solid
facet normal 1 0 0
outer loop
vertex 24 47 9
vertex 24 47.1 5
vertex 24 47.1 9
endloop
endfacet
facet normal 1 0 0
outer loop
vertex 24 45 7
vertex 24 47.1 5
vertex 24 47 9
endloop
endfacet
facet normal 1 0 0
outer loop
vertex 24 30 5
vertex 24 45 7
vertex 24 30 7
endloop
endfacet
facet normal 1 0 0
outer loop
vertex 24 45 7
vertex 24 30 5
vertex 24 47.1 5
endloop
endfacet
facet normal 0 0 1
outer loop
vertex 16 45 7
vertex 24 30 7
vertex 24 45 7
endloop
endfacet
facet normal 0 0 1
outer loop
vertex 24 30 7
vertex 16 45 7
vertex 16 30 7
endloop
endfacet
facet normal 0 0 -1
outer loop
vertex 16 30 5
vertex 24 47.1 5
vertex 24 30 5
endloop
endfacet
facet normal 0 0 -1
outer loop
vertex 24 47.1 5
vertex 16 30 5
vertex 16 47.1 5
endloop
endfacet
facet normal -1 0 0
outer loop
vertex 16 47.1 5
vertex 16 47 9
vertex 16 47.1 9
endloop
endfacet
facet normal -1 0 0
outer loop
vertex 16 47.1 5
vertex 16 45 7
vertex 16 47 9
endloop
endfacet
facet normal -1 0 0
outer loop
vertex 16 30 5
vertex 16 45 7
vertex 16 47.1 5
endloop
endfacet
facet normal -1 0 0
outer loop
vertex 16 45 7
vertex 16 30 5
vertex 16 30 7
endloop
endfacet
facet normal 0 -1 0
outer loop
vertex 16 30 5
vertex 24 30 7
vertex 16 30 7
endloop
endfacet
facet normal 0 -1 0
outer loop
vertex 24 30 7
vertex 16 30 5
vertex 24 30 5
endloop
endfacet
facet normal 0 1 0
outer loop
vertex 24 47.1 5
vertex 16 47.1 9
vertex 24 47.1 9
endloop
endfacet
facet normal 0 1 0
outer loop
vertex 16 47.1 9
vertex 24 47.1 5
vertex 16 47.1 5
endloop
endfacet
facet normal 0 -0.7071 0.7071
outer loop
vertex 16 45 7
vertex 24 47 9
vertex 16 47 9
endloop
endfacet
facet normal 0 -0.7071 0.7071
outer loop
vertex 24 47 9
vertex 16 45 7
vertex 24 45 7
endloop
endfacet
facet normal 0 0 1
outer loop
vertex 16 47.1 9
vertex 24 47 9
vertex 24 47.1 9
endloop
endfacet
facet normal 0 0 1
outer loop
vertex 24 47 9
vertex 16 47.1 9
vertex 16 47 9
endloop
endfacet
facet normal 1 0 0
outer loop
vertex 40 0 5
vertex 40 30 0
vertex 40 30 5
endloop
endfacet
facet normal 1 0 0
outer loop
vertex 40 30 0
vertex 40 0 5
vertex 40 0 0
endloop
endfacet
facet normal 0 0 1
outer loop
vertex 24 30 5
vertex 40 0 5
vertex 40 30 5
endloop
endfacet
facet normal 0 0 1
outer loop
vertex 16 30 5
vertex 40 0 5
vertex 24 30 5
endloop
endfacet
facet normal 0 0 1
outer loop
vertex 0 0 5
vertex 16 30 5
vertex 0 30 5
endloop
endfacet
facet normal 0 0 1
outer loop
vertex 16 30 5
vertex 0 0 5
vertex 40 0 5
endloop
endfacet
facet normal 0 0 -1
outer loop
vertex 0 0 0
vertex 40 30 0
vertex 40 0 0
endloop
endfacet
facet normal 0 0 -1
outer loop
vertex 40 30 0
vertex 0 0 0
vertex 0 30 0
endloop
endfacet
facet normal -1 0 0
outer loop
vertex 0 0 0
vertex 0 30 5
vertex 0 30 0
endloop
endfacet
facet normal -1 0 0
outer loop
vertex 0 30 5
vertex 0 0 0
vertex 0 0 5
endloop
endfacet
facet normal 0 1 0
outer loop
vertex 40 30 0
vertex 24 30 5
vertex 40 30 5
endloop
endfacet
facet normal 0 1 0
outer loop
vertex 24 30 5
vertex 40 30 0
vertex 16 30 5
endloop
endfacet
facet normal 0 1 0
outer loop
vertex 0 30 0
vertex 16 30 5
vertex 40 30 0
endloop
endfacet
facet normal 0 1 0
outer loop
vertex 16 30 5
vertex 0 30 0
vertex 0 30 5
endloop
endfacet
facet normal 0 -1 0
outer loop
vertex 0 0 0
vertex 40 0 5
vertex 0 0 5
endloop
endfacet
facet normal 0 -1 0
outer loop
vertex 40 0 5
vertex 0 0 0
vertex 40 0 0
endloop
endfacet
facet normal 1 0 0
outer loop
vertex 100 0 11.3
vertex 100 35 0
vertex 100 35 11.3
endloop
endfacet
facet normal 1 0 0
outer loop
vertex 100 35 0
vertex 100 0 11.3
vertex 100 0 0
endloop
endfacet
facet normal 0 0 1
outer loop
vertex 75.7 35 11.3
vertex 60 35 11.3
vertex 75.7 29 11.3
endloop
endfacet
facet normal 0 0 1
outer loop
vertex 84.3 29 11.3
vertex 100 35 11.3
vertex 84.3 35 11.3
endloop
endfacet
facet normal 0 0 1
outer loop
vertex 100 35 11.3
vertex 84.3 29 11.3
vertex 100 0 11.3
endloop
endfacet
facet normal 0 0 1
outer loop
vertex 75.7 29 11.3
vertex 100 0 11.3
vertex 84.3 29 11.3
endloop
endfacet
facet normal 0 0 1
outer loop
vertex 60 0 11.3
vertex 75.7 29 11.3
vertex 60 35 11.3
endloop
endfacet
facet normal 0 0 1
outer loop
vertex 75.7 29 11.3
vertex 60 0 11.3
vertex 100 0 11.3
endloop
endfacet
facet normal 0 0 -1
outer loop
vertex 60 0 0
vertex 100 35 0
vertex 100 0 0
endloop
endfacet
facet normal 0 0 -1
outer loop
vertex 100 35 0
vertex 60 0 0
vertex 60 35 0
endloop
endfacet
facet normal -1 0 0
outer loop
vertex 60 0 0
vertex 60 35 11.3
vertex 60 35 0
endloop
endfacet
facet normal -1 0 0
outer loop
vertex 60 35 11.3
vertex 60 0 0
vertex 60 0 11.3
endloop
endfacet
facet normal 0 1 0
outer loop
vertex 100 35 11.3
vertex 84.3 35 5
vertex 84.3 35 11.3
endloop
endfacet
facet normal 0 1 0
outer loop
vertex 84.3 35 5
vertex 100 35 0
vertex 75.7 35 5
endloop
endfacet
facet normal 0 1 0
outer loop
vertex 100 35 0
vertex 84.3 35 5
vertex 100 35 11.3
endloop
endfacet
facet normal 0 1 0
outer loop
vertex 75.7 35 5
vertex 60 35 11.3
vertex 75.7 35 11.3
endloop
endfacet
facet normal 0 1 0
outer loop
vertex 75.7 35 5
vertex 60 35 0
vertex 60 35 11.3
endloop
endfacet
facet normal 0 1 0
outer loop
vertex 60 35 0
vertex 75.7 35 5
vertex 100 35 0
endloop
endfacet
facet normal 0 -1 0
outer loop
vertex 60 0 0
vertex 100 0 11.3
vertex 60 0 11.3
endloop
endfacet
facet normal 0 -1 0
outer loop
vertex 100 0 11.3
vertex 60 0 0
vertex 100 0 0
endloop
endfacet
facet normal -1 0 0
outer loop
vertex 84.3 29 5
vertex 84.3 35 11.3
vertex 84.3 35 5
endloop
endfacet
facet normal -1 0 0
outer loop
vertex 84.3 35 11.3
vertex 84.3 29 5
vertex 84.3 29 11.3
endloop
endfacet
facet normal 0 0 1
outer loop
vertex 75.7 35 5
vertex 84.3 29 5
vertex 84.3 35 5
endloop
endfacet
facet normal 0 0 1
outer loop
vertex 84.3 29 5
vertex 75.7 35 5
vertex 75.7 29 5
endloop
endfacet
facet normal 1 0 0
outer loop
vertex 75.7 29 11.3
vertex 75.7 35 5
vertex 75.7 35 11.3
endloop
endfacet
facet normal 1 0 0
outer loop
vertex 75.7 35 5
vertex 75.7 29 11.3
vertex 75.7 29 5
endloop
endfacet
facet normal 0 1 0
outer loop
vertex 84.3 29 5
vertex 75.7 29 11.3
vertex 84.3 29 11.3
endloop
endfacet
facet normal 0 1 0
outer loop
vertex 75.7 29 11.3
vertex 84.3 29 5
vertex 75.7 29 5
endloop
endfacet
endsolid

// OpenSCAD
// Parametric snap-fit cantilever joint
// Common for enclosures and removable panels

base_width = 40;
base_depth = 30;
base_height = 5;
snap_width = 8;
snap_length = 15;
snap_thickness = 2;
snap_hook_height = 2;
snap_hook_angle = 45;
clearance = 0.3;

$fn = 32;

module snap_male() {
    // Base plate
    cube([base_width, base_depth, base_height]);
    
    // Snap cantilever
    translate([(base_width - snap_width)/2, base_depth, base_height]) {
        // Flexible arm
        cube([snap_width, snap_length, snap_thickness]);
        
        // Hook
        translate([0, snap_length, 0])
        hull() {
            cube([snap_width, 0.1, snap_thickness]);
            translate([0, snap_hook_height * tan(snap_hook_angle), 0])
            cube([snap_width, 0.1, snap_thickness + snap_hook_height]);
        }
    }
}

module snap_female() {
    slot_width = snap_width + clearance*2;
    slot_length = snap_length + snap_hook_height + clearance;
    slot_height = snap_thickness + snap_hook_height + clearance;
    
    difference() {
        // Base plate
        cube([base_width, base_depth + 5, base_height + slot_height + 2]);
        
        // Snap slot
        translate([(base_width - slot_width)/2, base_depth - 1, base_height])
        cube([slot_width, slot_length + 2, slot_height + 3]);
        
        // Entry ramp for snap
        translate([(base_width - slot_width)/2, base_depth + slot_length - snap_hook_height, base_height])
        rotate([-snap_hook_angle, 0, 0])
        cube([slot_width, snap_hook_height*2, slot_height*2]);
    }
}

// Display parts side by side
snap_male();
translate([base_width + 20, 0, 0])
snap_female();
